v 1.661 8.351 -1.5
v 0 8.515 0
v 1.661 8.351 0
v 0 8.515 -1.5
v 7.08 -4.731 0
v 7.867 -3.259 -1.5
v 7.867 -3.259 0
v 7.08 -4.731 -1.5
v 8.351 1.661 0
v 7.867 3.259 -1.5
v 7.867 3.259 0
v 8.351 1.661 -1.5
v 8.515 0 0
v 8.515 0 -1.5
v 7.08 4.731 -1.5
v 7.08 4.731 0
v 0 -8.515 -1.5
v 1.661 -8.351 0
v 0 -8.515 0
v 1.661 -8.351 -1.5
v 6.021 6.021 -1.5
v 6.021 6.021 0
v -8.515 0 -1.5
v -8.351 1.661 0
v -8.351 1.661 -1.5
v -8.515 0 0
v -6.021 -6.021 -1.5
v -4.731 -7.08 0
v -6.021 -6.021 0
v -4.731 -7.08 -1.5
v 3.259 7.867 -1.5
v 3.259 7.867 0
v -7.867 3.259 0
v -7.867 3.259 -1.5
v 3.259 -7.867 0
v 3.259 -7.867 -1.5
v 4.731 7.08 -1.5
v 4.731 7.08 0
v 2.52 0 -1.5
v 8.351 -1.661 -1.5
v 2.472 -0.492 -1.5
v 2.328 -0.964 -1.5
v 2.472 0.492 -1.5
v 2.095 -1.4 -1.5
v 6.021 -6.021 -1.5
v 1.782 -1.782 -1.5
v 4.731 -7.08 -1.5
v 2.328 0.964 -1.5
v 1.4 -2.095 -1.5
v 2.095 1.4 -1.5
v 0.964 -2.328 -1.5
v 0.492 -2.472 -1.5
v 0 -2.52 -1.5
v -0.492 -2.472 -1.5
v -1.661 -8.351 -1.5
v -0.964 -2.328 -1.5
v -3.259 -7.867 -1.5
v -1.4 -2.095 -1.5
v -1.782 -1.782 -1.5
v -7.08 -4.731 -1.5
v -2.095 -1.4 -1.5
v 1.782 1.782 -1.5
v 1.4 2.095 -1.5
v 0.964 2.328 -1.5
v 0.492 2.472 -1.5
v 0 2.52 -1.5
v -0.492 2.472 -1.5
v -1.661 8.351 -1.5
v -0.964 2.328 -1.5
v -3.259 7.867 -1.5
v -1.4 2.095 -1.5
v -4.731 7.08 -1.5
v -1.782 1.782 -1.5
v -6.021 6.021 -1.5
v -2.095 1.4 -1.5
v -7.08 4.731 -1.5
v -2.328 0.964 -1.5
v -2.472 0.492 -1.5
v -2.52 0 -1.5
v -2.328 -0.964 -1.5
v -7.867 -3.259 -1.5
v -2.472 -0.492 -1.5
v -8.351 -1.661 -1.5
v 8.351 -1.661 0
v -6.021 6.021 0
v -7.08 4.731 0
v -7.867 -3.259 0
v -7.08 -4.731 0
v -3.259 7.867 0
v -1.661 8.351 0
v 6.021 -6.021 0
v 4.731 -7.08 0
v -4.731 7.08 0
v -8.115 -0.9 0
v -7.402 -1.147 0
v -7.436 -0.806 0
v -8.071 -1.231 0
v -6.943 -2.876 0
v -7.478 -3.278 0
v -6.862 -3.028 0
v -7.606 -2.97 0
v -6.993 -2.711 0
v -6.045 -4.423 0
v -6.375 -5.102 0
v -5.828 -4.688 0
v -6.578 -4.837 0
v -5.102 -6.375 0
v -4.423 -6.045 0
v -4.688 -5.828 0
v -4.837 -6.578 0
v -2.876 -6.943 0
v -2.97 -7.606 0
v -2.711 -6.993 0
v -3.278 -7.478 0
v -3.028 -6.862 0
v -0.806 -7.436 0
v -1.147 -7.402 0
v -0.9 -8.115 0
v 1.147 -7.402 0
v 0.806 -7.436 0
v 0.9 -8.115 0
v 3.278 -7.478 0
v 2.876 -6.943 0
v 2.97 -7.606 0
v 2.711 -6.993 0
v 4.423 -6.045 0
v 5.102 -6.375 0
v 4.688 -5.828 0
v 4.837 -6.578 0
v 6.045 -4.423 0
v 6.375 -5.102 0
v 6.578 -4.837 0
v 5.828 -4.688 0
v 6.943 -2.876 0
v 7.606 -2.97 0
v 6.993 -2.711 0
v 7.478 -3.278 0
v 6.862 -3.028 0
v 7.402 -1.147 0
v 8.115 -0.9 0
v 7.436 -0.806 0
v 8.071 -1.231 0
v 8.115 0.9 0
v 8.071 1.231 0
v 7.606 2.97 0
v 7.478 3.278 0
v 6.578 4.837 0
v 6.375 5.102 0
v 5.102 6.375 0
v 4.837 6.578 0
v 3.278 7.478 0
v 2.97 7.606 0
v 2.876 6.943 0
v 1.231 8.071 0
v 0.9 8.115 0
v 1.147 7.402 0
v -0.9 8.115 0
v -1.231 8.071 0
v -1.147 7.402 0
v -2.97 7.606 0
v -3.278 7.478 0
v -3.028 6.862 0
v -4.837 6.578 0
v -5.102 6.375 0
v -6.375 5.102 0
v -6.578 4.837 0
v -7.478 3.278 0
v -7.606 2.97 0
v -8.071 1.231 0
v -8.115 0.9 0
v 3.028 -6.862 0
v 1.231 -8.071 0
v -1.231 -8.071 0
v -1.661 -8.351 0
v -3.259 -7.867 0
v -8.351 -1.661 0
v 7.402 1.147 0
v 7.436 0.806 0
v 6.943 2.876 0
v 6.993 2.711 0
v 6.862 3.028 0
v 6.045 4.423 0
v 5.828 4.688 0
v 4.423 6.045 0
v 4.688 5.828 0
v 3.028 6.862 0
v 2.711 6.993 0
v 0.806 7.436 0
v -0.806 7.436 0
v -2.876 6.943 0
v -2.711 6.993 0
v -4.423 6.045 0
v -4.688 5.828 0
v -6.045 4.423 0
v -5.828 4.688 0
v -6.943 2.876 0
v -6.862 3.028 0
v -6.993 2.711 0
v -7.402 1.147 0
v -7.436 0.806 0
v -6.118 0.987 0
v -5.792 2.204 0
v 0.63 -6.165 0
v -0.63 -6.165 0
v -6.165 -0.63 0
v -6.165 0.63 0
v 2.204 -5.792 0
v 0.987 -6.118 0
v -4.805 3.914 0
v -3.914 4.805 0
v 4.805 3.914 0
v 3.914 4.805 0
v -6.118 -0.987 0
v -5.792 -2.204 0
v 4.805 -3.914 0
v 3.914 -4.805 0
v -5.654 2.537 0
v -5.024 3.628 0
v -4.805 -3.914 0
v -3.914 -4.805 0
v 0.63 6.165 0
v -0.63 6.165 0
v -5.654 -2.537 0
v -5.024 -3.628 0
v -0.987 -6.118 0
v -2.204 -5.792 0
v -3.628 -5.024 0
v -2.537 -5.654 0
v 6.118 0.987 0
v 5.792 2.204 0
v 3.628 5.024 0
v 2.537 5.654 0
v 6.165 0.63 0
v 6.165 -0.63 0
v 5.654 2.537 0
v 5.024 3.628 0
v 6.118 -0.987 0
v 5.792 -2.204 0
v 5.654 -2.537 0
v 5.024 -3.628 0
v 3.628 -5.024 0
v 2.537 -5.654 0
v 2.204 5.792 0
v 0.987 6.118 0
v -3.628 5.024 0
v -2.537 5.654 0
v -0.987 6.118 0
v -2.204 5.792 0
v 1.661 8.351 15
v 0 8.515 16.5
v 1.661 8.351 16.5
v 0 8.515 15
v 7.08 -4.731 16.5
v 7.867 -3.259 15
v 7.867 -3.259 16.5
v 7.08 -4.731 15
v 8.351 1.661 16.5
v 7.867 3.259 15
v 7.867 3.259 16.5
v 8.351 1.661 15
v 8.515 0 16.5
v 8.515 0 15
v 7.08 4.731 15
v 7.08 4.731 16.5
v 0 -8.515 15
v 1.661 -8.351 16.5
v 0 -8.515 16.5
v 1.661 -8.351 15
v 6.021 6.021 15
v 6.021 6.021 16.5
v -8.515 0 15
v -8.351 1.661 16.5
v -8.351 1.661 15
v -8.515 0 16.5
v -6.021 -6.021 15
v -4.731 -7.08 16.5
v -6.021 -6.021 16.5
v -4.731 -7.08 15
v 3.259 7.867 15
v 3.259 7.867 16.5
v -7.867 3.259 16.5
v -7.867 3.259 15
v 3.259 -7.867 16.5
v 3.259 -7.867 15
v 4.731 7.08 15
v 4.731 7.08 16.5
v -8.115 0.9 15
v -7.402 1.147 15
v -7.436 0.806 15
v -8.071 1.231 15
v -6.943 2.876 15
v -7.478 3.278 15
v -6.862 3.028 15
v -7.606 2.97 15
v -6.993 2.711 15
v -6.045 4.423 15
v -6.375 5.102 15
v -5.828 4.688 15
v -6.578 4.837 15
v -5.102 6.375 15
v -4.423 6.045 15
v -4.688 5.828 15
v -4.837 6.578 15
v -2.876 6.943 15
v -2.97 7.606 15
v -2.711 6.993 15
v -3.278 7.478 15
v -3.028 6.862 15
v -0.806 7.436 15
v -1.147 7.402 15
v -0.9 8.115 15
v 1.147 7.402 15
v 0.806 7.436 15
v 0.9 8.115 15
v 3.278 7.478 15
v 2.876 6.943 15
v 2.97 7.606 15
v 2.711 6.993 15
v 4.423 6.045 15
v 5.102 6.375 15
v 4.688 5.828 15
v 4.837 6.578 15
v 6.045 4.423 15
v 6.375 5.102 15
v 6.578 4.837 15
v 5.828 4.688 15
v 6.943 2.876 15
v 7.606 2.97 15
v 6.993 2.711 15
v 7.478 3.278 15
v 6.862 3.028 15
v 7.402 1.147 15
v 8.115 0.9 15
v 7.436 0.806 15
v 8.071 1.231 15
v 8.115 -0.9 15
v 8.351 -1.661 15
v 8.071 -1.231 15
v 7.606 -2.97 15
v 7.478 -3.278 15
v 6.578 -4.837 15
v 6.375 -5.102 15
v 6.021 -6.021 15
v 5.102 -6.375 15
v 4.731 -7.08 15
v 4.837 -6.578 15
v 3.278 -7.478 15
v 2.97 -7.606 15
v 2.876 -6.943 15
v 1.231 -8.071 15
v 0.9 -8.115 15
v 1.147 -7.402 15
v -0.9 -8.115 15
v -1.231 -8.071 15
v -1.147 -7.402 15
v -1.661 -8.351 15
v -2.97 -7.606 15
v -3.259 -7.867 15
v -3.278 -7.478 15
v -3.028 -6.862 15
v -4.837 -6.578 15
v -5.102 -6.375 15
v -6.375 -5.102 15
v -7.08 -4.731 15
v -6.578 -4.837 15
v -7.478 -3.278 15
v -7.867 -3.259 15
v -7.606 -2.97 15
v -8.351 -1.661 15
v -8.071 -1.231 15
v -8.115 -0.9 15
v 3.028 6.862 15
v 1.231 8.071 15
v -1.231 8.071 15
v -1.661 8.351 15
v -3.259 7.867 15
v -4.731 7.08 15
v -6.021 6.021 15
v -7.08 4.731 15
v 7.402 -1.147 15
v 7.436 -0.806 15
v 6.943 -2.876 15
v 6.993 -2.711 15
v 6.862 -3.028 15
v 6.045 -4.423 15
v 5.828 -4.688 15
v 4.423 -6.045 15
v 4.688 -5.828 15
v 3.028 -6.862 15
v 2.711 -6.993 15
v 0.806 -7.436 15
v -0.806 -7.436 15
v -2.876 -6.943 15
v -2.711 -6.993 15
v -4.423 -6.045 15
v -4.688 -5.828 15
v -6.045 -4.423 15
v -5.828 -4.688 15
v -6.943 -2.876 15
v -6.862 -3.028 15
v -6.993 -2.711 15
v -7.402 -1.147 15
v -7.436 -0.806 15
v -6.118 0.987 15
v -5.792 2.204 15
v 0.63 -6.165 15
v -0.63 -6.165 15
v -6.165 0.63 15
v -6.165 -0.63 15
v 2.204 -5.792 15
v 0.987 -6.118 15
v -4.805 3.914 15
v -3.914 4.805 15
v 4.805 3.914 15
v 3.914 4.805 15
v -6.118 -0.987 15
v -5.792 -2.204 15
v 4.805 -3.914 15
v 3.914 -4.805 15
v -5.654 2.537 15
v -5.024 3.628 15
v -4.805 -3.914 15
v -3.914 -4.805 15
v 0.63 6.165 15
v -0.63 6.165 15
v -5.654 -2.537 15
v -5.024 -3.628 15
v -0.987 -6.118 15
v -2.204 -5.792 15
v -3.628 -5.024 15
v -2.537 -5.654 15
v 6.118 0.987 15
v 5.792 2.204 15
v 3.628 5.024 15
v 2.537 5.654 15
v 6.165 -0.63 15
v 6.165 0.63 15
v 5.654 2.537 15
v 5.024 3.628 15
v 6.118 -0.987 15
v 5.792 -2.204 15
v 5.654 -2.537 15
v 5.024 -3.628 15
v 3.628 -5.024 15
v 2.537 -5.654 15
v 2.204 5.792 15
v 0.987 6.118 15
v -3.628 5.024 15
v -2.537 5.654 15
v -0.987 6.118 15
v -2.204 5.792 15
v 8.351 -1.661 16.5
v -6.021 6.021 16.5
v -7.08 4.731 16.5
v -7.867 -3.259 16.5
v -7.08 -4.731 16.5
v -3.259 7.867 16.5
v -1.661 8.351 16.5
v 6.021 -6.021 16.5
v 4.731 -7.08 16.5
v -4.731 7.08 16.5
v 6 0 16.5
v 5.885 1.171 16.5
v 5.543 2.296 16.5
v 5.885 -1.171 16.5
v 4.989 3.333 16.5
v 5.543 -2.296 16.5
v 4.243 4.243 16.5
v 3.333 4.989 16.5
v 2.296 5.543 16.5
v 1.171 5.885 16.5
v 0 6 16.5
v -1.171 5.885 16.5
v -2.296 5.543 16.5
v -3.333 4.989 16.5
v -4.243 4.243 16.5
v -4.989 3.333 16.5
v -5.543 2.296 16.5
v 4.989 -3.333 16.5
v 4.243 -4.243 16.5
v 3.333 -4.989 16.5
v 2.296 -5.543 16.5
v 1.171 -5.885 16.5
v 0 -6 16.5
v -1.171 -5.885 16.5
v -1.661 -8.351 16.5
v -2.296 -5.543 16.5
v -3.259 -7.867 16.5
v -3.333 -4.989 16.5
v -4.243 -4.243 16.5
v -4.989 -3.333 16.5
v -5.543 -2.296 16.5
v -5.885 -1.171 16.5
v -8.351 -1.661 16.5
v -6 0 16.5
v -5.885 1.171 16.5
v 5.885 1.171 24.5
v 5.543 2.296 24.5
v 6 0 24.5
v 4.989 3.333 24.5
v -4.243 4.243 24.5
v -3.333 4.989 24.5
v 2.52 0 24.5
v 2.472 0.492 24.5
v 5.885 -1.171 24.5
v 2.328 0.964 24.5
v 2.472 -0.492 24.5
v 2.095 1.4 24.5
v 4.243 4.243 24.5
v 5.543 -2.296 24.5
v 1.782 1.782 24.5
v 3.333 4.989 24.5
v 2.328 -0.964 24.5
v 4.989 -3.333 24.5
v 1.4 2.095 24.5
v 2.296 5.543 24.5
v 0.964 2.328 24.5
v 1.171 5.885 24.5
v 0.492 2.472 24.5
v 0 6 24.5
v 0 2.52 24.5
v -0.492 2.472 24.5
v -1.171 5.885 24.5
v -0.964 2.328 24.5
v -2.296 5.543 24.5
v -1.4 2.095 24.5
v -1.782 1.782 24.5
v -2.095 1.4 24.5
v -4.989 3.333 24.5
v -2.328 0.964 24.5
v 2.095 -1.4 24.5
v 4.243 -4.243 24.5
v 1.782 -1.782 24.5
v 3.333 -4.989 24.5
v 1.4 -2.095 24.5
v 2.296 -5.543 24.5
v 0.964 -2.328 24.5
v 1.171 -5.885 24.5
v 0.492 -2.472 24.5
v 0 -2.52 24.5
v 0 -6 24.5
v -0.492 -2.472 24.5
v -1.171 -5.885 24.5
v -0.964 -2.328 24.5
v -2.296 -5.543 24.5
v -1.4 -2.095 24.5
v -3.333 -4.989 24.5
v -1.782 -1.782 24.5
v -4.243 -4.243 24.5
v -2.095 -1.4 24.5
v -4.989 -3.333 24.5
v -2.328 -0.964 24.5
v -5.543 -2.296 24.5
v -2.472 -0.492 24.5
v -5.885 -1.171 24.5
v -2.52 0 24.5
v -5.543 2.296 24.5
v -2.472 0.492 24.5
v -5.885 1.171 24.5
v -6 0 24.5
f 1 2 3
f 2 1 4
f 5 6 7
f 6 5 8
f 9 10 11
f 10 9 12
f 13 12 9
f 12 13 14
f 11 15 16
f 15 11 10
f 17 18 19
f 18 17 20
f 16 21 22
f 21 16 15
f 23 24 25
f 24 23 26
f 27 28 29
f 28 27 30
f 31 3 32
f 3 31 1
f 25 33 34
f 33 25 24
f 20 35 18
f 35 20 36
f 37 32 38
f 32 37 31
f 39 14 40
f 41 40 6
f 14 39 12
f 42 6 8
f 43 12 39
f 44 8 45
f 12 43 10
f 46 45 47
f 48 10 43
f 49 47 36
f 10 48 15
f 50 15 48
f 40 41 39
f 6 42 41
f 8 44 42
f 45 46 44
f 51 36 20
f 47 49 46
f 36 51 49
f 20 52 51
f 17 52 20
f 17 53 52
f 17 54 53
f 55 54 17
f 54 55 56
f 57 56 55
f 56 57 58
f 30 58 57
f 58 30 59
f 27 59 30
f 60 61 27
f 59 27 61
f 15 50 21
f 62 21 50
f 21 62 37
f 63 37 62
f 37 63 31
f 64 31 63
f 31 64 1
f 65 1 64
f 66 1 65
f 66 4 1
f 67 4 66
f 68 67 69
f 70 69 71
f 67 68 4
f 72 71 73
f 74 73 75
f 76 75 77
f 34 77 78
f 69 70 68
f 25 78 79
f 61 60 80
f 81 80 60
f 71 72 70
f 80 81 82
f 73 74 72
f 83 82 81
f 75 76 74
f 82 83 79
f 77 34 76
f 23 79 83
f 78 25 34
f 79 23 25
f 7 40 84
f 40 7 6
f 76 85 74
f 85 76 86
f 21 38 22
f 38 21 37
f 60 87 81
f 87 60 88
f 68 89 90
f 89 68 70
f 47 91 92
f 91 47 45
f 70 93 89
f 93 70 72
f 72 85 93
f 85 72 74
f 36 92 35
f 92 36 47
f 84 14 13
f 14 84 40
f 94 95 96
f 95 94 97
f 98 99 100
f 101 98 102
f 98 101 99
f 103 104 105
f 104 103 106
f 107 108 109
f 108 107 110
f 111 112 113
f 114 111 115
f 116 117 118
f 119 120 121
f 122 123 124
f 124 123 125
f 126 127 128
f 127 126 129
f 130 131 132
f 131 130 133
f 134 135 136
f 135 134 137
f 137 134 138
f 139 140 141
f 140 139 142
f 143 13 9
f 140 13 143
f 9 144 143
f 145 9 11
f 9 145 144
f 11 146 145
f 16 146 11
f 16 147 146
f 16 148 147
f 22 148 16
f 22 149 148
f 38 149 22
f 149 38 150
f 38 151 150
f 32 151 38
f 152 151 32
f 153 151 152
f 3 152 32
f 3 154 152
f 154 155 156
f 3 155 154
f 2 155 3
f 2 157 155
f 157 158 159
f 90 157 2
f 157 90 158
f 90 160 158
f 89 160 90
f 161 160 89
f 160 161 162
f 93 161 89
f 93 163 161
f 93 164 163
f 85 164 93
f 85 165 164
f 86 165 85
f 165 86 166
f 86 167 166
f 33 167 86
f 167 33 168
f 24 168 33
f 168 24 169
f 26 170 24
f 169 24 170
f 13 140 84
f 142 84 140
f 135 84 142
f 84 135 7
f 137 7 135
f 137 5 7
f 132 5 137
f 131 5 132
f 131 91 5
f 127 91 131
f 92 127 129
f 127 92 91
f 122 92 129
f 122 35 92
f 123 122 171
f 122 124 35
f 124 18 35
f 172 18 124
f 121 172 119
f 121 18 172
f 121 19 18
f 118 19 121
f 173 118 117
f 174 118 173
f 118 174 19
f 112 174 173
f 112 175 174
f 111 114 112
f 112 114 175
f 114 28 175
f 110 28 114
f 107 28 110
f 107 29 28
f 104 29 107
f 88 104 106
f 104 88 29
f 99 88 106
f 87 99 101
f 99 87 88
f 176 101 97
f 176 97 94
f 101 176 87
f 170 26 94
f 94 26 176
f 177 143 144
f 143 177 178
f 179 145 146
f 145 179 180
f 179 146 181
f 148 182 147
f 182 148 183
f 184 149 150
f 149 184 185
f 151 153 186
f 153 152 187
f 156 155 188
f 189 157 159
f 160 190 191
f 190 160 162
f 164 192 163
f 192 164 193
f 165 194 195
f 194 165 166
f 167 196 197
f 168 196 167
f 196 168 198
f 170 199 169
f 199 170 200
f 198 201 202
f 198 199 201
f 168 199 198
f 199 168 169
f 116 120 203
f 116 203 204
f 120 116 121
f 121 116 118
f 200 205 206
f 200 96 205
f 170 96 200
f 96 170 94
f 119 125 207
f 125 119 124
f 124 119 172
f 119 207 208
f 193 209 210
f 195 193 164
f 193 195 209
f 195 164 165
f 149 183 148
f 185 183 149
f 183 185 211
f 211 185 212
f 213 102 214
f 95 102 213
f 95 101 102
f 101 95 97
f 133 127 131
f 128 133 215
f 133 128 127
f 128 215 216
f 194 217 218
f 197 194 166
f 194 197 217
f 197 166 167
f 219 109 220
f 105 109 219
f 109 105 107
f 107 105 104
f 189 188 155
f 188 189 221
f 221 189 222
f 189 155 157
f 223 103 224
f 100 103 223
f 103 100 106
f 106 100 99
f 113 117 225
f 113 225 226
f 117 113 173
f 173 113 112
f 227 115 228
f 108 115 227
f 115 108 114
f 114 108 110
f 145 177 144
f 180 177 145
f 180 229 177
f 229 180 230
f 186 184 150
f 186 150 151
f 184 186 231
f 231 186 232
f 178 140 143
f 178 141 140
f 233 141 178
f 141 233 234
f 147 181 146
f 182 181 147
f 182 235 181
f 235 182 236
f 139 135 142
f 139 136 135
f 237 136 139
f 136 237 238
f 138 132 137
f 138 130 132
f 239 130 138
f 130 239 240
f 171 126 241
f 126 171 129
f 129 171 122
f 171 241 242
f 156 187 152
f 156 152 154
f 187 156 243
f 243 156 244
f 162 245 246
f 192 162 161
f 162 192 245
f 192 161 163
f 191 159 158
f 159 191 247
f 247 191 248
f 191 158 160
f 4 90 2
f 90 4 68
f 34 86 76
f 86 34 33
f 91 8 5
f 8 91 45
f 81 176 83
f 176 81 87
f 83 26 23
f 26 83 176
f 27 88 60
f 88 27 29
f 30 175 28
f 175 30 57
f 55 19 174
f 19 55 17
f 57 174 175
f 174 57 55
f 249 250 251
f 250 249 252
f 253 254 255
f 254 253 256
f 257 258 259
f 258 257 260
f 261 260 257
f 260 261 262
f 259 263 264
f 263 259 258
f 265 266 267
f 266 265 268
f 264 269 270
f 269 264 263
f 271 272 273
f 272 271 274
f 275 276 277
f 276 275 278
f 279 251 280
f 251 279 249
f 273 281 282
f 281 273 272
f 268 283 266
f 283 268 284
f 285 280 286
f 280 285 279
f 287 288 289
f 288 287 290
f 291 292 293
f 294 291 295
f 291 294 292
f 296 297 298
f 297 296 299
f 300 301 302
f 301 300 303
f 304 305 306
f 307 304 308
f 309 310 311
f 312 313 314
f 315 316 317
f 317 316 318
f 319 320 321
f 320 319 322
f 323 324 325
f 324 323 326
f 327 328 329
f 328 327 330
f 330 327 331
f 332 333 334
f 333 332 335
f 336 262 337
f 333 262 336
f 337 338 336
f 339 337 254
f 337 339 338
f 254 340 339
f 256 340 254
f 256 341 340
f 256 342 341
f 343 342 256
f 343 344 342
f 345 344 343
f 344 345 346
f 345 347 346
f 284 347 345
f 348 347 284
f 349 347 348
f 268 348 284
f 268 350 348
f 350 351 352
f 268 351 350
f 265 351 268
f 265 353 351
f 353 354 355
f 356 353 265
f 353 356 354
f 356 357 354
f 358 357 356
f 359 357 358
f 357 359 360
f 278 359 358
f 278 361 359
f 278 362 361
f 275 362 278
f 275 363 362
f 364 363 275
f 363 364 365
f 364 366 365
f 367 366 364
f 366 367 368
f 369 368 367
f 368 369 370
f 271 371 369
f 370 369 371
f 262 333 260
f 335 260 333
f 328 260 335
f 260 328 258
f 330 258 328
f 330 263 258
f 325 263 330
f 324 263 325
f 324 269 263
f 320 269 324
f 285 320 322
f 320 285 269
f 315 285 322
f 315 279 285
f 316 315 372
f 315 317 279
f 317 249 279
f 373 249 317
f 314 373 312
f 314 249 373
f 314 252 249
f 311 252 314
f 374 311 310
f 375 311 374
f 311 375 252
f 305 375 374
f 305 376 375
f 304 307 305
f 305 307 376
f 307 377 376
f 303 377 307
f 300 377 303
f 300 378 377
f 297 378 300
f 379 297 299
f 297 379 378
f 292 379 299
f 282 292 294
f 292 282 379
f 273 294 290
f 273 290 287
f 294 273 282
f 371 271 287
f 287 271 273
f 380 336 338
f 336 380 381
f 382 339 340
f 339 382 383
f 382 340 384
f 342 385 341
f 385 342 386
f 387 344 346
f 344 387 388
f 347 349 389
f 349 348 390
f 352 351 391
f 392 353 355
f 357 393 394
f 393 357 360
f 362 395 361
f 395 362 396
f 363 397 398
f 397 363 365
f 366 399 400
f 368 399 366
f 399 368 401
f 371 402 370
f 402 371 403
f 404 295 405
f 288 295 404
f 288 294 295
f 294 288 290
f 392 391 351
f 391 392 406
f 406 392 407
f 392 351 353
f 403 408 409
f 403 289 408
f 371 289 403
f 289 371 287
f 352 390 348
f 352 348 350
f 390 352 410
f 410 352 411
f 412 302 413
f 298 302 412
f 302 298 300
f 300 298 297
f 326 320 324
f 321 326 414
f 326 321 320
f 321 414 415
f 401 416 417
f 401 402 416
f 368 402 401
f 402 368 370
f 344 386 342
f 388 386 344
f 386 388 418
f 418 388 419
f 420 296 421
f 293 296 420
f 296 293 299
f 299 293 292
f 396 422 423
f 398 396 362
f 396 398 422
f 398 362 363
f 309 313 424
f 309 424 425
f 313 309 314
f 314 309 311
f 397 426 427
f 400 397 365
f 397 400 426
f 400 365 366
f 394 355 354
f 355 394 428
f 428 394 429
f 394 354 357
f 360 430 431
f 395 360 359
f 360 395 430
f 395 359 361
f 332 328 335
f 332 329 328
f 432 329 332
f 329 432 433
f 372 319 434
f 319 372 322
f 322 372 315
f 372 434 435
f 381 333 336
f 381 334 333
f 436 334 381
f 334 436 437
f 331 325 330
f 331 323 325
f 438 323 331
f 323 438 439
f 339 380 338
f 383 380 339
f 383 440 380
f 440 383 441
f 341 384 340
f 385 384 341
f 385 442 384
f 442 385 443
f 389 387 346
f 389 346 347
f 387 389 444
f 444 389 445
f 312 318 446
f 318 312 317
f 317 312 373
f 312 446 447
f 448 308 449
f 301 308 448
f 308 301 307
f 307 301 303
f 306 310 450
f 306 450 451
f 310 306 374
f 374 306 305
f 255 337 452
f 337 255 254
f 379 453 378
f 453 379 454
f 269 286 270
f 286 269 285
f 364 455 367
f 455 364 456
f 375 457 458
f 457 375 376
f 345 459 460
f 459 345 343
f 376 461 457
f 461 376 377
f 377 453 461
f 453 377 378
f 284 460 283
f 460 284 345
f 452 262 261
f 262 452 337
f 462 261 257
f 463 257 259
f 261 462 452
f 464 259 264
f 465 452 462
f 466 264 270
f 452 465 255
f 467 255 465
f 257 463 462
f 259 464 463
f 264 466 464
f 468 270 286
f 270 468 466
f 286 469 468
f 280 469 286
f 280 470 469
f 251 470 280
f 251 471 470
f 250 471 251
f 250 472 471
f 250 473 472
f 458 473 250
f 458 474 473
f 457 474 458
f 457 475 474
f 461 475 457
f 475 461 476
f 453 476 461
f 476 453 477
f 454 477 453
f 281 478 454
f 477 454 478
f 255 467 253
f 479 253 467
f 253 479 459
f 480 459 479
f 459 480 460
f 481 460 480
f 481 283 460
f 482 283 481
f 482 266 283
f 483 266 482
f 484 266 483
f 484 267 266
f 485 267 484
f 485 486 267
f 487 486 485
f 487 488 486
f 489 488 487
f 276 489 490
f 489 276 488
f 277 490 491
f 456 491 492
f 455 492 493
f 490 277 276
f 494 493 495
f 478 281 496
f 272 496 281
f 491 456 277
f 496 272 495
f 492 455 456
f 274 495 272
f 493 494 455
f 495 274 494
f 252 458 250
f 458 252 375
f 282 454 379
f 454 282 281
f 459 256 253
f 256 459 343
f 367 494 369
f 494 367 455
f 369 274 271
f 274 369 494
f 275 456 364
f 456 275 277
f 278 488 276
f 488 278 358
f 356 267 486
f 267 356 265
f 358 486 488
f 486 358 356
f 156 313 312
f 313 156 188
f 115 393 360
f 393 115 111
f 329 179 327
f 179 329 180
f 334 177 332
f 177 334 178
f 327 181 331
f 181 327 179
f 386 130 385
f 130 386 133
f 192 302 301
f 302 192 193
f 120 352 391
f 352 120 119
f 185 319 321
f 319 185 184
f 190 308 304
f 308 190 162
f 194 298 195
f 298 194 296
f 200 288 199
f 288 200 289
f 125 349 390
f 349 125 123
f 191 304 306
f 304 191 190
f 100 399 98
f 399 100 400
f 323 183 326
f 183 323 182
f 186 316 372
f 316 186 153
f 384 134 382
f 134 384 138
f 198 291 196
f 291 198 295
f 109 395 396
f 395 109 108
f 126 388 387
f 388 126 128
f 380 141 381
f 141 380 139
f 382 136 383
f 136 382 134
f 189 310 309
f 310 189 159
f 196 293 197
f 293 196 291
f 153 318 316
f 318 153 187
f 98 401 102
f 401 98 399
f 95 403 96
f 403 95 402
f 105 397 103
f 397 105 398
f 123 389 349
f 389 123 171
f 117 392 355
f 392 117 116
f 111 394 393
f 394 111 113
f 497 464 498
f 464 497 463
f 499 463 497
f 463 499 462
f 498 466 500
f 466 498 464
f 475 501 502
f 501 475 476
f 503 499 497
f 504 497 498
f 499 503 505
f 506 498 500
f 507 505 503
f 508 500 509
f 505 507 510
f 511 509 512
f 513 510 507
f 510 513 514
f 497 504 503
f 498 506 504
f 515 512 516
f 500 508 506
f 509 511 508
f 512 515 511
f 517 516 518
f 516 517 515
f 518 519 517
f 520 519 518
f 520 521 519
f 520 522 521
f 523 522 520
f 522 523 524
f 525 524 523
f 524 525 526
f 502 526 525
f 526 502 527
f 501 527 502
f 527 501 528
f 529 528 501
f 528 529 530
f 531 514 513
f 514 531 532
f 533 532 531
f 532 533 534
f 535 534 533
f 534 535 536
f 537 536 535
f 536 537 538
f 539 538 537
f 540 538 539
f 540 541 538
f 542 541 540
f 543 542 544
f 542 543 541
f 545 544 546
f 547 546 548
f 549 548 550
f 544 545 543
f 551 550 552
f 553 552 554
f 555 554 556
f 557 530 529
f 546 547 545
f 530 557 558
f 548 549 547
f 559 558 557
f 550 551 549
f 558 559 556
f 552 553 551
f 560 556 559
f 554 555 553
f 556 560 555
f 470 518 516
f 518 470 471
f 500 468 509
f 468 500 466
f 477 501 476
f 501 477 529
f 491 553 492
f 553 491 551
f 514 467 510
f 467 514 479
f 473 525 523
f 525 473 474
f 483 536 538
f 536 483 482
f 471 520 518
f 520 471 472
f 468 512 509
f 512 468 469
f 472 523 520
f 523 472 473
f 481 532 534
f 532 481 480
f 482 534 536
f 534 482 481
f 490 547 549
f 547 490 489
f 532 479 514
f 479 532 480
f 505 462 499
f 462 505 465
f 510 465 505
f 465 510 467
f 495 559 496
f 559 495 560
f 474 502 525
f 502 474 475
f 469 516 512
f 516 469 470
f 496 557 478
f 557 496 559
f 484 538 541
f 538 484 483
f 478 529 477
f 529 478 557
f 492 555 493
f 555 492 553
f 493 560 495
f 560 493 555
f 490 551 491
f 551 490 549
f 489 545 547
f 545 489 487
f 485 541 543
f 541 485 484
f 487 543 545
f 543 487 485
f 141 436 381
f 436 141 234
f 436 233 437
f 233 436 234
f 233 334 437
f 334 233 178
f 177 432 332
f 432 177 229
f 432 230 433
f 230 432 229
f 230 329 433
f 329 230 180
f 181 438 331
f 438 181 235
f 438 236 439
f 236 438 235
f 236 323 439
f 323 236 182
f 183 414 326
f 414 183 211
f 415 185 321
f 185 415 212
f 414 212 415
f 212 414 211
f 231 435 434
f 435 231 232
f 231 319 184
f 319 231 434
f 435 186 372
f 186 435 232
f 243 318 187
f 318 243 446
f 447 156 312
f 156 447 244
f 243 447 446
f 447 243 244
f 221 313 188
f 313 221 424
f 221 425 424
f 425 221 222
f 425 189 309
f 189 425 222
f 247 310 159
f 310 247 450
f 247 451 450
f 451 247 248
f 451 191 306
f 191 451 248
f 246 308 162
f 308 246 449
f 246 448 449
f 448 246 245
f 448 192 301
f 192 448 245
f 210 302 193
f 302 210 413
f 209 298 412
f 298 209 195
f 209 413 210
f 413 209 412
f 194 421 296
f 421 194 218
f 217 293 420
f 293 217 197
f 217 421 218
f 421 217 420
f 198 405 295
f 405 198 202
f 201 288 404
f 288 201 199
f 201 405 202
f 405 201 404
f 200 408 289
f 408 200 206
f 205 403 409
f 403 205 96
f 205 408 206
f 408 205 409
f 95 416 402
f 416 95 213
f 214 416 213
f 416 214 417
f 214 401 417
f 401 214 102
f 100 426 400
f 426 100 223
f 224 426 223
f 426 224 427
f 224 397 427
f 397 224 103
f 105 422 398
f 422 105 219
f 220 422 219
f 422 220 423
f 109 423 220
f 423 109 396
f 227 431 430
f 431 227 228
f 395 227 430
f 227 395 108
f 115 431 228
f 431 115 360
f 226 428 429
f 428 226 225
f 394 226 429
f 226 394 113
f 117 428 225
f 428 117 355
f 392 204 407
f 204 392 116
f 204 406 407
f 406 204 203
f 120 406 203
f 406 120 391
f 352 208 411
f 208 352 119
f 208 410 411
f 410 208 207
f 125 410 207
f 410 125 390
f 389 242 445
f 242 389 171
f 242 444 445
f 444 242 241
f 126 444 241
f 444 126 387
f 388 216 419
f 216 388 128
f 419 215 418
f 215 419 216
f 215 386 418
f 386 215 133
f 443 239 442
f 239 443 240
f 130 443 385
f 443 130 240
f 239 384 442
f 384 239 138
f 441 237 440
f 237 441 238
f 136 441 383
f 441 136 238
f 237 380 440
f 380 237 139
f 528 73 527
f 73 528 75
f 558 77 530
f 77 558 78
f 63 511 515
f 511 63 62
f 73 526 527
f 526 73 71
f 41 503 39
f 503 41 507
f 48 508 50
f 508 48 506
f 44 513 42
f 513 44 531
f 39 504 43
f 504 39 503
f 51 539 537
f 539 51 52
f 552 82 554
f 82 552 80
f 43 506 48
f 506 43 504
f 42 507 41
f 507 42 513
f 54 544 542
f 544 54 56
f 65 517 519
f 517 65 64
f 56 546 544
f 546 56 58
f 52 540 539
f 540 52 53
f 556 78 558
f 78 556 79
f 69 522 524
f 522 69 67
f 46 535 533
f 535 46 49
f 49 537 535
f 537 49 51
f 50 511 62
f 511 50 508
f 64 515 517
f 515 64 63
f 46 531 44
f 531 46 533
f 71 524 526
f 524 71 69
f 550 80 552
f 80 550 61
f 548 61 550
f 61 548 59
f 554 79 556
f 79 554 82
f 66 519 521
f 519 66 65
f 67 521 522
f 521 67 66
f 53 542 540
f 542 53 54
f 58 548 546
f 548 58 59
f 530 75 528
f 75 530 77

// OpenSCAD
$fn = 32;

// ----------------------------------------------------------------------
// Timing pulley: GT2 24T, pitch 2 mm, 17.03 mm x 26 mm
// ----------------------------------------------------------------------

// --- parameters (mm) ---
pitch_mm = 2;             // belt pitch
tooth_count = 24;         // number of grooves
width = 15;               // belt width between the flanges
tip_d = 15.03;            // tip circle diameter
root_d = 13.53;           // groove bottom diameter
groove_h = 0.75;          // groove depth
tooth_w = 1.5;            // groove width at the tip circle
side_d = 17.03;           // flange diameter
side_t = 1.5;             // flange thickness
spigot_d = 11.93;         // flange spigot, sunk into the rim
spigot_h = 1.2;           // spigot depth into the rim
hub_bore = 5.04;          // shaft bore
hub_d = 12;               // hub diameter
hub_h = 8;                // hub above the flange
bottom_z = -1.5;          // lowest point of the pulley
top_z = 24.5;             // highest point of the pulley

module rim() {
  cylinder(h = width, d = tip_d);
}

module groove_cutter() {
  /* belt tooth groove: deeper than wide, cut through the belt width */
  translate([root_d / 2, 0, 0])
    linear_extrude(height = width)
      polygon(points = [[-0.6, -tooth_w * 0.42], [groove_h + 0.6, -tooth_w * 0.6],
                        [groove_h + 0.6, tooth_w * 0.6], [-0.6, tooth_w * 0.42]]);
}

module flanges() {
  translate([0, 0, -side_t]) cylinder(h = side_t, d = side_d);
  translate([0, 0, width]) cylinder(h = side_t, d = side_d);
  translate([0, 0, -spigot_h]) cylinder(h = spigot_h + 0.6, d = spigot_d);
  translate([0, 0, width - 0.6]) cylinder(h = spigot_h + 0.6, d = spigot_d);
}

module hub() {
  translate([0, 0, bottom_z]) cylinder(h = top_z - bottom_z, d = hub_d);
}

difference() {
  union() {
    rim();
    hub();
    flanges();
  }
  for (i = [0 : tooth_count - 1]) rotate([0, 0, i * 360 / tooth_count]) groove_cutter();
  translate([0, 0, bottom_z - 1]) cylinder(h = top_z - bottom_z + 2, d = hub_bore);
}
